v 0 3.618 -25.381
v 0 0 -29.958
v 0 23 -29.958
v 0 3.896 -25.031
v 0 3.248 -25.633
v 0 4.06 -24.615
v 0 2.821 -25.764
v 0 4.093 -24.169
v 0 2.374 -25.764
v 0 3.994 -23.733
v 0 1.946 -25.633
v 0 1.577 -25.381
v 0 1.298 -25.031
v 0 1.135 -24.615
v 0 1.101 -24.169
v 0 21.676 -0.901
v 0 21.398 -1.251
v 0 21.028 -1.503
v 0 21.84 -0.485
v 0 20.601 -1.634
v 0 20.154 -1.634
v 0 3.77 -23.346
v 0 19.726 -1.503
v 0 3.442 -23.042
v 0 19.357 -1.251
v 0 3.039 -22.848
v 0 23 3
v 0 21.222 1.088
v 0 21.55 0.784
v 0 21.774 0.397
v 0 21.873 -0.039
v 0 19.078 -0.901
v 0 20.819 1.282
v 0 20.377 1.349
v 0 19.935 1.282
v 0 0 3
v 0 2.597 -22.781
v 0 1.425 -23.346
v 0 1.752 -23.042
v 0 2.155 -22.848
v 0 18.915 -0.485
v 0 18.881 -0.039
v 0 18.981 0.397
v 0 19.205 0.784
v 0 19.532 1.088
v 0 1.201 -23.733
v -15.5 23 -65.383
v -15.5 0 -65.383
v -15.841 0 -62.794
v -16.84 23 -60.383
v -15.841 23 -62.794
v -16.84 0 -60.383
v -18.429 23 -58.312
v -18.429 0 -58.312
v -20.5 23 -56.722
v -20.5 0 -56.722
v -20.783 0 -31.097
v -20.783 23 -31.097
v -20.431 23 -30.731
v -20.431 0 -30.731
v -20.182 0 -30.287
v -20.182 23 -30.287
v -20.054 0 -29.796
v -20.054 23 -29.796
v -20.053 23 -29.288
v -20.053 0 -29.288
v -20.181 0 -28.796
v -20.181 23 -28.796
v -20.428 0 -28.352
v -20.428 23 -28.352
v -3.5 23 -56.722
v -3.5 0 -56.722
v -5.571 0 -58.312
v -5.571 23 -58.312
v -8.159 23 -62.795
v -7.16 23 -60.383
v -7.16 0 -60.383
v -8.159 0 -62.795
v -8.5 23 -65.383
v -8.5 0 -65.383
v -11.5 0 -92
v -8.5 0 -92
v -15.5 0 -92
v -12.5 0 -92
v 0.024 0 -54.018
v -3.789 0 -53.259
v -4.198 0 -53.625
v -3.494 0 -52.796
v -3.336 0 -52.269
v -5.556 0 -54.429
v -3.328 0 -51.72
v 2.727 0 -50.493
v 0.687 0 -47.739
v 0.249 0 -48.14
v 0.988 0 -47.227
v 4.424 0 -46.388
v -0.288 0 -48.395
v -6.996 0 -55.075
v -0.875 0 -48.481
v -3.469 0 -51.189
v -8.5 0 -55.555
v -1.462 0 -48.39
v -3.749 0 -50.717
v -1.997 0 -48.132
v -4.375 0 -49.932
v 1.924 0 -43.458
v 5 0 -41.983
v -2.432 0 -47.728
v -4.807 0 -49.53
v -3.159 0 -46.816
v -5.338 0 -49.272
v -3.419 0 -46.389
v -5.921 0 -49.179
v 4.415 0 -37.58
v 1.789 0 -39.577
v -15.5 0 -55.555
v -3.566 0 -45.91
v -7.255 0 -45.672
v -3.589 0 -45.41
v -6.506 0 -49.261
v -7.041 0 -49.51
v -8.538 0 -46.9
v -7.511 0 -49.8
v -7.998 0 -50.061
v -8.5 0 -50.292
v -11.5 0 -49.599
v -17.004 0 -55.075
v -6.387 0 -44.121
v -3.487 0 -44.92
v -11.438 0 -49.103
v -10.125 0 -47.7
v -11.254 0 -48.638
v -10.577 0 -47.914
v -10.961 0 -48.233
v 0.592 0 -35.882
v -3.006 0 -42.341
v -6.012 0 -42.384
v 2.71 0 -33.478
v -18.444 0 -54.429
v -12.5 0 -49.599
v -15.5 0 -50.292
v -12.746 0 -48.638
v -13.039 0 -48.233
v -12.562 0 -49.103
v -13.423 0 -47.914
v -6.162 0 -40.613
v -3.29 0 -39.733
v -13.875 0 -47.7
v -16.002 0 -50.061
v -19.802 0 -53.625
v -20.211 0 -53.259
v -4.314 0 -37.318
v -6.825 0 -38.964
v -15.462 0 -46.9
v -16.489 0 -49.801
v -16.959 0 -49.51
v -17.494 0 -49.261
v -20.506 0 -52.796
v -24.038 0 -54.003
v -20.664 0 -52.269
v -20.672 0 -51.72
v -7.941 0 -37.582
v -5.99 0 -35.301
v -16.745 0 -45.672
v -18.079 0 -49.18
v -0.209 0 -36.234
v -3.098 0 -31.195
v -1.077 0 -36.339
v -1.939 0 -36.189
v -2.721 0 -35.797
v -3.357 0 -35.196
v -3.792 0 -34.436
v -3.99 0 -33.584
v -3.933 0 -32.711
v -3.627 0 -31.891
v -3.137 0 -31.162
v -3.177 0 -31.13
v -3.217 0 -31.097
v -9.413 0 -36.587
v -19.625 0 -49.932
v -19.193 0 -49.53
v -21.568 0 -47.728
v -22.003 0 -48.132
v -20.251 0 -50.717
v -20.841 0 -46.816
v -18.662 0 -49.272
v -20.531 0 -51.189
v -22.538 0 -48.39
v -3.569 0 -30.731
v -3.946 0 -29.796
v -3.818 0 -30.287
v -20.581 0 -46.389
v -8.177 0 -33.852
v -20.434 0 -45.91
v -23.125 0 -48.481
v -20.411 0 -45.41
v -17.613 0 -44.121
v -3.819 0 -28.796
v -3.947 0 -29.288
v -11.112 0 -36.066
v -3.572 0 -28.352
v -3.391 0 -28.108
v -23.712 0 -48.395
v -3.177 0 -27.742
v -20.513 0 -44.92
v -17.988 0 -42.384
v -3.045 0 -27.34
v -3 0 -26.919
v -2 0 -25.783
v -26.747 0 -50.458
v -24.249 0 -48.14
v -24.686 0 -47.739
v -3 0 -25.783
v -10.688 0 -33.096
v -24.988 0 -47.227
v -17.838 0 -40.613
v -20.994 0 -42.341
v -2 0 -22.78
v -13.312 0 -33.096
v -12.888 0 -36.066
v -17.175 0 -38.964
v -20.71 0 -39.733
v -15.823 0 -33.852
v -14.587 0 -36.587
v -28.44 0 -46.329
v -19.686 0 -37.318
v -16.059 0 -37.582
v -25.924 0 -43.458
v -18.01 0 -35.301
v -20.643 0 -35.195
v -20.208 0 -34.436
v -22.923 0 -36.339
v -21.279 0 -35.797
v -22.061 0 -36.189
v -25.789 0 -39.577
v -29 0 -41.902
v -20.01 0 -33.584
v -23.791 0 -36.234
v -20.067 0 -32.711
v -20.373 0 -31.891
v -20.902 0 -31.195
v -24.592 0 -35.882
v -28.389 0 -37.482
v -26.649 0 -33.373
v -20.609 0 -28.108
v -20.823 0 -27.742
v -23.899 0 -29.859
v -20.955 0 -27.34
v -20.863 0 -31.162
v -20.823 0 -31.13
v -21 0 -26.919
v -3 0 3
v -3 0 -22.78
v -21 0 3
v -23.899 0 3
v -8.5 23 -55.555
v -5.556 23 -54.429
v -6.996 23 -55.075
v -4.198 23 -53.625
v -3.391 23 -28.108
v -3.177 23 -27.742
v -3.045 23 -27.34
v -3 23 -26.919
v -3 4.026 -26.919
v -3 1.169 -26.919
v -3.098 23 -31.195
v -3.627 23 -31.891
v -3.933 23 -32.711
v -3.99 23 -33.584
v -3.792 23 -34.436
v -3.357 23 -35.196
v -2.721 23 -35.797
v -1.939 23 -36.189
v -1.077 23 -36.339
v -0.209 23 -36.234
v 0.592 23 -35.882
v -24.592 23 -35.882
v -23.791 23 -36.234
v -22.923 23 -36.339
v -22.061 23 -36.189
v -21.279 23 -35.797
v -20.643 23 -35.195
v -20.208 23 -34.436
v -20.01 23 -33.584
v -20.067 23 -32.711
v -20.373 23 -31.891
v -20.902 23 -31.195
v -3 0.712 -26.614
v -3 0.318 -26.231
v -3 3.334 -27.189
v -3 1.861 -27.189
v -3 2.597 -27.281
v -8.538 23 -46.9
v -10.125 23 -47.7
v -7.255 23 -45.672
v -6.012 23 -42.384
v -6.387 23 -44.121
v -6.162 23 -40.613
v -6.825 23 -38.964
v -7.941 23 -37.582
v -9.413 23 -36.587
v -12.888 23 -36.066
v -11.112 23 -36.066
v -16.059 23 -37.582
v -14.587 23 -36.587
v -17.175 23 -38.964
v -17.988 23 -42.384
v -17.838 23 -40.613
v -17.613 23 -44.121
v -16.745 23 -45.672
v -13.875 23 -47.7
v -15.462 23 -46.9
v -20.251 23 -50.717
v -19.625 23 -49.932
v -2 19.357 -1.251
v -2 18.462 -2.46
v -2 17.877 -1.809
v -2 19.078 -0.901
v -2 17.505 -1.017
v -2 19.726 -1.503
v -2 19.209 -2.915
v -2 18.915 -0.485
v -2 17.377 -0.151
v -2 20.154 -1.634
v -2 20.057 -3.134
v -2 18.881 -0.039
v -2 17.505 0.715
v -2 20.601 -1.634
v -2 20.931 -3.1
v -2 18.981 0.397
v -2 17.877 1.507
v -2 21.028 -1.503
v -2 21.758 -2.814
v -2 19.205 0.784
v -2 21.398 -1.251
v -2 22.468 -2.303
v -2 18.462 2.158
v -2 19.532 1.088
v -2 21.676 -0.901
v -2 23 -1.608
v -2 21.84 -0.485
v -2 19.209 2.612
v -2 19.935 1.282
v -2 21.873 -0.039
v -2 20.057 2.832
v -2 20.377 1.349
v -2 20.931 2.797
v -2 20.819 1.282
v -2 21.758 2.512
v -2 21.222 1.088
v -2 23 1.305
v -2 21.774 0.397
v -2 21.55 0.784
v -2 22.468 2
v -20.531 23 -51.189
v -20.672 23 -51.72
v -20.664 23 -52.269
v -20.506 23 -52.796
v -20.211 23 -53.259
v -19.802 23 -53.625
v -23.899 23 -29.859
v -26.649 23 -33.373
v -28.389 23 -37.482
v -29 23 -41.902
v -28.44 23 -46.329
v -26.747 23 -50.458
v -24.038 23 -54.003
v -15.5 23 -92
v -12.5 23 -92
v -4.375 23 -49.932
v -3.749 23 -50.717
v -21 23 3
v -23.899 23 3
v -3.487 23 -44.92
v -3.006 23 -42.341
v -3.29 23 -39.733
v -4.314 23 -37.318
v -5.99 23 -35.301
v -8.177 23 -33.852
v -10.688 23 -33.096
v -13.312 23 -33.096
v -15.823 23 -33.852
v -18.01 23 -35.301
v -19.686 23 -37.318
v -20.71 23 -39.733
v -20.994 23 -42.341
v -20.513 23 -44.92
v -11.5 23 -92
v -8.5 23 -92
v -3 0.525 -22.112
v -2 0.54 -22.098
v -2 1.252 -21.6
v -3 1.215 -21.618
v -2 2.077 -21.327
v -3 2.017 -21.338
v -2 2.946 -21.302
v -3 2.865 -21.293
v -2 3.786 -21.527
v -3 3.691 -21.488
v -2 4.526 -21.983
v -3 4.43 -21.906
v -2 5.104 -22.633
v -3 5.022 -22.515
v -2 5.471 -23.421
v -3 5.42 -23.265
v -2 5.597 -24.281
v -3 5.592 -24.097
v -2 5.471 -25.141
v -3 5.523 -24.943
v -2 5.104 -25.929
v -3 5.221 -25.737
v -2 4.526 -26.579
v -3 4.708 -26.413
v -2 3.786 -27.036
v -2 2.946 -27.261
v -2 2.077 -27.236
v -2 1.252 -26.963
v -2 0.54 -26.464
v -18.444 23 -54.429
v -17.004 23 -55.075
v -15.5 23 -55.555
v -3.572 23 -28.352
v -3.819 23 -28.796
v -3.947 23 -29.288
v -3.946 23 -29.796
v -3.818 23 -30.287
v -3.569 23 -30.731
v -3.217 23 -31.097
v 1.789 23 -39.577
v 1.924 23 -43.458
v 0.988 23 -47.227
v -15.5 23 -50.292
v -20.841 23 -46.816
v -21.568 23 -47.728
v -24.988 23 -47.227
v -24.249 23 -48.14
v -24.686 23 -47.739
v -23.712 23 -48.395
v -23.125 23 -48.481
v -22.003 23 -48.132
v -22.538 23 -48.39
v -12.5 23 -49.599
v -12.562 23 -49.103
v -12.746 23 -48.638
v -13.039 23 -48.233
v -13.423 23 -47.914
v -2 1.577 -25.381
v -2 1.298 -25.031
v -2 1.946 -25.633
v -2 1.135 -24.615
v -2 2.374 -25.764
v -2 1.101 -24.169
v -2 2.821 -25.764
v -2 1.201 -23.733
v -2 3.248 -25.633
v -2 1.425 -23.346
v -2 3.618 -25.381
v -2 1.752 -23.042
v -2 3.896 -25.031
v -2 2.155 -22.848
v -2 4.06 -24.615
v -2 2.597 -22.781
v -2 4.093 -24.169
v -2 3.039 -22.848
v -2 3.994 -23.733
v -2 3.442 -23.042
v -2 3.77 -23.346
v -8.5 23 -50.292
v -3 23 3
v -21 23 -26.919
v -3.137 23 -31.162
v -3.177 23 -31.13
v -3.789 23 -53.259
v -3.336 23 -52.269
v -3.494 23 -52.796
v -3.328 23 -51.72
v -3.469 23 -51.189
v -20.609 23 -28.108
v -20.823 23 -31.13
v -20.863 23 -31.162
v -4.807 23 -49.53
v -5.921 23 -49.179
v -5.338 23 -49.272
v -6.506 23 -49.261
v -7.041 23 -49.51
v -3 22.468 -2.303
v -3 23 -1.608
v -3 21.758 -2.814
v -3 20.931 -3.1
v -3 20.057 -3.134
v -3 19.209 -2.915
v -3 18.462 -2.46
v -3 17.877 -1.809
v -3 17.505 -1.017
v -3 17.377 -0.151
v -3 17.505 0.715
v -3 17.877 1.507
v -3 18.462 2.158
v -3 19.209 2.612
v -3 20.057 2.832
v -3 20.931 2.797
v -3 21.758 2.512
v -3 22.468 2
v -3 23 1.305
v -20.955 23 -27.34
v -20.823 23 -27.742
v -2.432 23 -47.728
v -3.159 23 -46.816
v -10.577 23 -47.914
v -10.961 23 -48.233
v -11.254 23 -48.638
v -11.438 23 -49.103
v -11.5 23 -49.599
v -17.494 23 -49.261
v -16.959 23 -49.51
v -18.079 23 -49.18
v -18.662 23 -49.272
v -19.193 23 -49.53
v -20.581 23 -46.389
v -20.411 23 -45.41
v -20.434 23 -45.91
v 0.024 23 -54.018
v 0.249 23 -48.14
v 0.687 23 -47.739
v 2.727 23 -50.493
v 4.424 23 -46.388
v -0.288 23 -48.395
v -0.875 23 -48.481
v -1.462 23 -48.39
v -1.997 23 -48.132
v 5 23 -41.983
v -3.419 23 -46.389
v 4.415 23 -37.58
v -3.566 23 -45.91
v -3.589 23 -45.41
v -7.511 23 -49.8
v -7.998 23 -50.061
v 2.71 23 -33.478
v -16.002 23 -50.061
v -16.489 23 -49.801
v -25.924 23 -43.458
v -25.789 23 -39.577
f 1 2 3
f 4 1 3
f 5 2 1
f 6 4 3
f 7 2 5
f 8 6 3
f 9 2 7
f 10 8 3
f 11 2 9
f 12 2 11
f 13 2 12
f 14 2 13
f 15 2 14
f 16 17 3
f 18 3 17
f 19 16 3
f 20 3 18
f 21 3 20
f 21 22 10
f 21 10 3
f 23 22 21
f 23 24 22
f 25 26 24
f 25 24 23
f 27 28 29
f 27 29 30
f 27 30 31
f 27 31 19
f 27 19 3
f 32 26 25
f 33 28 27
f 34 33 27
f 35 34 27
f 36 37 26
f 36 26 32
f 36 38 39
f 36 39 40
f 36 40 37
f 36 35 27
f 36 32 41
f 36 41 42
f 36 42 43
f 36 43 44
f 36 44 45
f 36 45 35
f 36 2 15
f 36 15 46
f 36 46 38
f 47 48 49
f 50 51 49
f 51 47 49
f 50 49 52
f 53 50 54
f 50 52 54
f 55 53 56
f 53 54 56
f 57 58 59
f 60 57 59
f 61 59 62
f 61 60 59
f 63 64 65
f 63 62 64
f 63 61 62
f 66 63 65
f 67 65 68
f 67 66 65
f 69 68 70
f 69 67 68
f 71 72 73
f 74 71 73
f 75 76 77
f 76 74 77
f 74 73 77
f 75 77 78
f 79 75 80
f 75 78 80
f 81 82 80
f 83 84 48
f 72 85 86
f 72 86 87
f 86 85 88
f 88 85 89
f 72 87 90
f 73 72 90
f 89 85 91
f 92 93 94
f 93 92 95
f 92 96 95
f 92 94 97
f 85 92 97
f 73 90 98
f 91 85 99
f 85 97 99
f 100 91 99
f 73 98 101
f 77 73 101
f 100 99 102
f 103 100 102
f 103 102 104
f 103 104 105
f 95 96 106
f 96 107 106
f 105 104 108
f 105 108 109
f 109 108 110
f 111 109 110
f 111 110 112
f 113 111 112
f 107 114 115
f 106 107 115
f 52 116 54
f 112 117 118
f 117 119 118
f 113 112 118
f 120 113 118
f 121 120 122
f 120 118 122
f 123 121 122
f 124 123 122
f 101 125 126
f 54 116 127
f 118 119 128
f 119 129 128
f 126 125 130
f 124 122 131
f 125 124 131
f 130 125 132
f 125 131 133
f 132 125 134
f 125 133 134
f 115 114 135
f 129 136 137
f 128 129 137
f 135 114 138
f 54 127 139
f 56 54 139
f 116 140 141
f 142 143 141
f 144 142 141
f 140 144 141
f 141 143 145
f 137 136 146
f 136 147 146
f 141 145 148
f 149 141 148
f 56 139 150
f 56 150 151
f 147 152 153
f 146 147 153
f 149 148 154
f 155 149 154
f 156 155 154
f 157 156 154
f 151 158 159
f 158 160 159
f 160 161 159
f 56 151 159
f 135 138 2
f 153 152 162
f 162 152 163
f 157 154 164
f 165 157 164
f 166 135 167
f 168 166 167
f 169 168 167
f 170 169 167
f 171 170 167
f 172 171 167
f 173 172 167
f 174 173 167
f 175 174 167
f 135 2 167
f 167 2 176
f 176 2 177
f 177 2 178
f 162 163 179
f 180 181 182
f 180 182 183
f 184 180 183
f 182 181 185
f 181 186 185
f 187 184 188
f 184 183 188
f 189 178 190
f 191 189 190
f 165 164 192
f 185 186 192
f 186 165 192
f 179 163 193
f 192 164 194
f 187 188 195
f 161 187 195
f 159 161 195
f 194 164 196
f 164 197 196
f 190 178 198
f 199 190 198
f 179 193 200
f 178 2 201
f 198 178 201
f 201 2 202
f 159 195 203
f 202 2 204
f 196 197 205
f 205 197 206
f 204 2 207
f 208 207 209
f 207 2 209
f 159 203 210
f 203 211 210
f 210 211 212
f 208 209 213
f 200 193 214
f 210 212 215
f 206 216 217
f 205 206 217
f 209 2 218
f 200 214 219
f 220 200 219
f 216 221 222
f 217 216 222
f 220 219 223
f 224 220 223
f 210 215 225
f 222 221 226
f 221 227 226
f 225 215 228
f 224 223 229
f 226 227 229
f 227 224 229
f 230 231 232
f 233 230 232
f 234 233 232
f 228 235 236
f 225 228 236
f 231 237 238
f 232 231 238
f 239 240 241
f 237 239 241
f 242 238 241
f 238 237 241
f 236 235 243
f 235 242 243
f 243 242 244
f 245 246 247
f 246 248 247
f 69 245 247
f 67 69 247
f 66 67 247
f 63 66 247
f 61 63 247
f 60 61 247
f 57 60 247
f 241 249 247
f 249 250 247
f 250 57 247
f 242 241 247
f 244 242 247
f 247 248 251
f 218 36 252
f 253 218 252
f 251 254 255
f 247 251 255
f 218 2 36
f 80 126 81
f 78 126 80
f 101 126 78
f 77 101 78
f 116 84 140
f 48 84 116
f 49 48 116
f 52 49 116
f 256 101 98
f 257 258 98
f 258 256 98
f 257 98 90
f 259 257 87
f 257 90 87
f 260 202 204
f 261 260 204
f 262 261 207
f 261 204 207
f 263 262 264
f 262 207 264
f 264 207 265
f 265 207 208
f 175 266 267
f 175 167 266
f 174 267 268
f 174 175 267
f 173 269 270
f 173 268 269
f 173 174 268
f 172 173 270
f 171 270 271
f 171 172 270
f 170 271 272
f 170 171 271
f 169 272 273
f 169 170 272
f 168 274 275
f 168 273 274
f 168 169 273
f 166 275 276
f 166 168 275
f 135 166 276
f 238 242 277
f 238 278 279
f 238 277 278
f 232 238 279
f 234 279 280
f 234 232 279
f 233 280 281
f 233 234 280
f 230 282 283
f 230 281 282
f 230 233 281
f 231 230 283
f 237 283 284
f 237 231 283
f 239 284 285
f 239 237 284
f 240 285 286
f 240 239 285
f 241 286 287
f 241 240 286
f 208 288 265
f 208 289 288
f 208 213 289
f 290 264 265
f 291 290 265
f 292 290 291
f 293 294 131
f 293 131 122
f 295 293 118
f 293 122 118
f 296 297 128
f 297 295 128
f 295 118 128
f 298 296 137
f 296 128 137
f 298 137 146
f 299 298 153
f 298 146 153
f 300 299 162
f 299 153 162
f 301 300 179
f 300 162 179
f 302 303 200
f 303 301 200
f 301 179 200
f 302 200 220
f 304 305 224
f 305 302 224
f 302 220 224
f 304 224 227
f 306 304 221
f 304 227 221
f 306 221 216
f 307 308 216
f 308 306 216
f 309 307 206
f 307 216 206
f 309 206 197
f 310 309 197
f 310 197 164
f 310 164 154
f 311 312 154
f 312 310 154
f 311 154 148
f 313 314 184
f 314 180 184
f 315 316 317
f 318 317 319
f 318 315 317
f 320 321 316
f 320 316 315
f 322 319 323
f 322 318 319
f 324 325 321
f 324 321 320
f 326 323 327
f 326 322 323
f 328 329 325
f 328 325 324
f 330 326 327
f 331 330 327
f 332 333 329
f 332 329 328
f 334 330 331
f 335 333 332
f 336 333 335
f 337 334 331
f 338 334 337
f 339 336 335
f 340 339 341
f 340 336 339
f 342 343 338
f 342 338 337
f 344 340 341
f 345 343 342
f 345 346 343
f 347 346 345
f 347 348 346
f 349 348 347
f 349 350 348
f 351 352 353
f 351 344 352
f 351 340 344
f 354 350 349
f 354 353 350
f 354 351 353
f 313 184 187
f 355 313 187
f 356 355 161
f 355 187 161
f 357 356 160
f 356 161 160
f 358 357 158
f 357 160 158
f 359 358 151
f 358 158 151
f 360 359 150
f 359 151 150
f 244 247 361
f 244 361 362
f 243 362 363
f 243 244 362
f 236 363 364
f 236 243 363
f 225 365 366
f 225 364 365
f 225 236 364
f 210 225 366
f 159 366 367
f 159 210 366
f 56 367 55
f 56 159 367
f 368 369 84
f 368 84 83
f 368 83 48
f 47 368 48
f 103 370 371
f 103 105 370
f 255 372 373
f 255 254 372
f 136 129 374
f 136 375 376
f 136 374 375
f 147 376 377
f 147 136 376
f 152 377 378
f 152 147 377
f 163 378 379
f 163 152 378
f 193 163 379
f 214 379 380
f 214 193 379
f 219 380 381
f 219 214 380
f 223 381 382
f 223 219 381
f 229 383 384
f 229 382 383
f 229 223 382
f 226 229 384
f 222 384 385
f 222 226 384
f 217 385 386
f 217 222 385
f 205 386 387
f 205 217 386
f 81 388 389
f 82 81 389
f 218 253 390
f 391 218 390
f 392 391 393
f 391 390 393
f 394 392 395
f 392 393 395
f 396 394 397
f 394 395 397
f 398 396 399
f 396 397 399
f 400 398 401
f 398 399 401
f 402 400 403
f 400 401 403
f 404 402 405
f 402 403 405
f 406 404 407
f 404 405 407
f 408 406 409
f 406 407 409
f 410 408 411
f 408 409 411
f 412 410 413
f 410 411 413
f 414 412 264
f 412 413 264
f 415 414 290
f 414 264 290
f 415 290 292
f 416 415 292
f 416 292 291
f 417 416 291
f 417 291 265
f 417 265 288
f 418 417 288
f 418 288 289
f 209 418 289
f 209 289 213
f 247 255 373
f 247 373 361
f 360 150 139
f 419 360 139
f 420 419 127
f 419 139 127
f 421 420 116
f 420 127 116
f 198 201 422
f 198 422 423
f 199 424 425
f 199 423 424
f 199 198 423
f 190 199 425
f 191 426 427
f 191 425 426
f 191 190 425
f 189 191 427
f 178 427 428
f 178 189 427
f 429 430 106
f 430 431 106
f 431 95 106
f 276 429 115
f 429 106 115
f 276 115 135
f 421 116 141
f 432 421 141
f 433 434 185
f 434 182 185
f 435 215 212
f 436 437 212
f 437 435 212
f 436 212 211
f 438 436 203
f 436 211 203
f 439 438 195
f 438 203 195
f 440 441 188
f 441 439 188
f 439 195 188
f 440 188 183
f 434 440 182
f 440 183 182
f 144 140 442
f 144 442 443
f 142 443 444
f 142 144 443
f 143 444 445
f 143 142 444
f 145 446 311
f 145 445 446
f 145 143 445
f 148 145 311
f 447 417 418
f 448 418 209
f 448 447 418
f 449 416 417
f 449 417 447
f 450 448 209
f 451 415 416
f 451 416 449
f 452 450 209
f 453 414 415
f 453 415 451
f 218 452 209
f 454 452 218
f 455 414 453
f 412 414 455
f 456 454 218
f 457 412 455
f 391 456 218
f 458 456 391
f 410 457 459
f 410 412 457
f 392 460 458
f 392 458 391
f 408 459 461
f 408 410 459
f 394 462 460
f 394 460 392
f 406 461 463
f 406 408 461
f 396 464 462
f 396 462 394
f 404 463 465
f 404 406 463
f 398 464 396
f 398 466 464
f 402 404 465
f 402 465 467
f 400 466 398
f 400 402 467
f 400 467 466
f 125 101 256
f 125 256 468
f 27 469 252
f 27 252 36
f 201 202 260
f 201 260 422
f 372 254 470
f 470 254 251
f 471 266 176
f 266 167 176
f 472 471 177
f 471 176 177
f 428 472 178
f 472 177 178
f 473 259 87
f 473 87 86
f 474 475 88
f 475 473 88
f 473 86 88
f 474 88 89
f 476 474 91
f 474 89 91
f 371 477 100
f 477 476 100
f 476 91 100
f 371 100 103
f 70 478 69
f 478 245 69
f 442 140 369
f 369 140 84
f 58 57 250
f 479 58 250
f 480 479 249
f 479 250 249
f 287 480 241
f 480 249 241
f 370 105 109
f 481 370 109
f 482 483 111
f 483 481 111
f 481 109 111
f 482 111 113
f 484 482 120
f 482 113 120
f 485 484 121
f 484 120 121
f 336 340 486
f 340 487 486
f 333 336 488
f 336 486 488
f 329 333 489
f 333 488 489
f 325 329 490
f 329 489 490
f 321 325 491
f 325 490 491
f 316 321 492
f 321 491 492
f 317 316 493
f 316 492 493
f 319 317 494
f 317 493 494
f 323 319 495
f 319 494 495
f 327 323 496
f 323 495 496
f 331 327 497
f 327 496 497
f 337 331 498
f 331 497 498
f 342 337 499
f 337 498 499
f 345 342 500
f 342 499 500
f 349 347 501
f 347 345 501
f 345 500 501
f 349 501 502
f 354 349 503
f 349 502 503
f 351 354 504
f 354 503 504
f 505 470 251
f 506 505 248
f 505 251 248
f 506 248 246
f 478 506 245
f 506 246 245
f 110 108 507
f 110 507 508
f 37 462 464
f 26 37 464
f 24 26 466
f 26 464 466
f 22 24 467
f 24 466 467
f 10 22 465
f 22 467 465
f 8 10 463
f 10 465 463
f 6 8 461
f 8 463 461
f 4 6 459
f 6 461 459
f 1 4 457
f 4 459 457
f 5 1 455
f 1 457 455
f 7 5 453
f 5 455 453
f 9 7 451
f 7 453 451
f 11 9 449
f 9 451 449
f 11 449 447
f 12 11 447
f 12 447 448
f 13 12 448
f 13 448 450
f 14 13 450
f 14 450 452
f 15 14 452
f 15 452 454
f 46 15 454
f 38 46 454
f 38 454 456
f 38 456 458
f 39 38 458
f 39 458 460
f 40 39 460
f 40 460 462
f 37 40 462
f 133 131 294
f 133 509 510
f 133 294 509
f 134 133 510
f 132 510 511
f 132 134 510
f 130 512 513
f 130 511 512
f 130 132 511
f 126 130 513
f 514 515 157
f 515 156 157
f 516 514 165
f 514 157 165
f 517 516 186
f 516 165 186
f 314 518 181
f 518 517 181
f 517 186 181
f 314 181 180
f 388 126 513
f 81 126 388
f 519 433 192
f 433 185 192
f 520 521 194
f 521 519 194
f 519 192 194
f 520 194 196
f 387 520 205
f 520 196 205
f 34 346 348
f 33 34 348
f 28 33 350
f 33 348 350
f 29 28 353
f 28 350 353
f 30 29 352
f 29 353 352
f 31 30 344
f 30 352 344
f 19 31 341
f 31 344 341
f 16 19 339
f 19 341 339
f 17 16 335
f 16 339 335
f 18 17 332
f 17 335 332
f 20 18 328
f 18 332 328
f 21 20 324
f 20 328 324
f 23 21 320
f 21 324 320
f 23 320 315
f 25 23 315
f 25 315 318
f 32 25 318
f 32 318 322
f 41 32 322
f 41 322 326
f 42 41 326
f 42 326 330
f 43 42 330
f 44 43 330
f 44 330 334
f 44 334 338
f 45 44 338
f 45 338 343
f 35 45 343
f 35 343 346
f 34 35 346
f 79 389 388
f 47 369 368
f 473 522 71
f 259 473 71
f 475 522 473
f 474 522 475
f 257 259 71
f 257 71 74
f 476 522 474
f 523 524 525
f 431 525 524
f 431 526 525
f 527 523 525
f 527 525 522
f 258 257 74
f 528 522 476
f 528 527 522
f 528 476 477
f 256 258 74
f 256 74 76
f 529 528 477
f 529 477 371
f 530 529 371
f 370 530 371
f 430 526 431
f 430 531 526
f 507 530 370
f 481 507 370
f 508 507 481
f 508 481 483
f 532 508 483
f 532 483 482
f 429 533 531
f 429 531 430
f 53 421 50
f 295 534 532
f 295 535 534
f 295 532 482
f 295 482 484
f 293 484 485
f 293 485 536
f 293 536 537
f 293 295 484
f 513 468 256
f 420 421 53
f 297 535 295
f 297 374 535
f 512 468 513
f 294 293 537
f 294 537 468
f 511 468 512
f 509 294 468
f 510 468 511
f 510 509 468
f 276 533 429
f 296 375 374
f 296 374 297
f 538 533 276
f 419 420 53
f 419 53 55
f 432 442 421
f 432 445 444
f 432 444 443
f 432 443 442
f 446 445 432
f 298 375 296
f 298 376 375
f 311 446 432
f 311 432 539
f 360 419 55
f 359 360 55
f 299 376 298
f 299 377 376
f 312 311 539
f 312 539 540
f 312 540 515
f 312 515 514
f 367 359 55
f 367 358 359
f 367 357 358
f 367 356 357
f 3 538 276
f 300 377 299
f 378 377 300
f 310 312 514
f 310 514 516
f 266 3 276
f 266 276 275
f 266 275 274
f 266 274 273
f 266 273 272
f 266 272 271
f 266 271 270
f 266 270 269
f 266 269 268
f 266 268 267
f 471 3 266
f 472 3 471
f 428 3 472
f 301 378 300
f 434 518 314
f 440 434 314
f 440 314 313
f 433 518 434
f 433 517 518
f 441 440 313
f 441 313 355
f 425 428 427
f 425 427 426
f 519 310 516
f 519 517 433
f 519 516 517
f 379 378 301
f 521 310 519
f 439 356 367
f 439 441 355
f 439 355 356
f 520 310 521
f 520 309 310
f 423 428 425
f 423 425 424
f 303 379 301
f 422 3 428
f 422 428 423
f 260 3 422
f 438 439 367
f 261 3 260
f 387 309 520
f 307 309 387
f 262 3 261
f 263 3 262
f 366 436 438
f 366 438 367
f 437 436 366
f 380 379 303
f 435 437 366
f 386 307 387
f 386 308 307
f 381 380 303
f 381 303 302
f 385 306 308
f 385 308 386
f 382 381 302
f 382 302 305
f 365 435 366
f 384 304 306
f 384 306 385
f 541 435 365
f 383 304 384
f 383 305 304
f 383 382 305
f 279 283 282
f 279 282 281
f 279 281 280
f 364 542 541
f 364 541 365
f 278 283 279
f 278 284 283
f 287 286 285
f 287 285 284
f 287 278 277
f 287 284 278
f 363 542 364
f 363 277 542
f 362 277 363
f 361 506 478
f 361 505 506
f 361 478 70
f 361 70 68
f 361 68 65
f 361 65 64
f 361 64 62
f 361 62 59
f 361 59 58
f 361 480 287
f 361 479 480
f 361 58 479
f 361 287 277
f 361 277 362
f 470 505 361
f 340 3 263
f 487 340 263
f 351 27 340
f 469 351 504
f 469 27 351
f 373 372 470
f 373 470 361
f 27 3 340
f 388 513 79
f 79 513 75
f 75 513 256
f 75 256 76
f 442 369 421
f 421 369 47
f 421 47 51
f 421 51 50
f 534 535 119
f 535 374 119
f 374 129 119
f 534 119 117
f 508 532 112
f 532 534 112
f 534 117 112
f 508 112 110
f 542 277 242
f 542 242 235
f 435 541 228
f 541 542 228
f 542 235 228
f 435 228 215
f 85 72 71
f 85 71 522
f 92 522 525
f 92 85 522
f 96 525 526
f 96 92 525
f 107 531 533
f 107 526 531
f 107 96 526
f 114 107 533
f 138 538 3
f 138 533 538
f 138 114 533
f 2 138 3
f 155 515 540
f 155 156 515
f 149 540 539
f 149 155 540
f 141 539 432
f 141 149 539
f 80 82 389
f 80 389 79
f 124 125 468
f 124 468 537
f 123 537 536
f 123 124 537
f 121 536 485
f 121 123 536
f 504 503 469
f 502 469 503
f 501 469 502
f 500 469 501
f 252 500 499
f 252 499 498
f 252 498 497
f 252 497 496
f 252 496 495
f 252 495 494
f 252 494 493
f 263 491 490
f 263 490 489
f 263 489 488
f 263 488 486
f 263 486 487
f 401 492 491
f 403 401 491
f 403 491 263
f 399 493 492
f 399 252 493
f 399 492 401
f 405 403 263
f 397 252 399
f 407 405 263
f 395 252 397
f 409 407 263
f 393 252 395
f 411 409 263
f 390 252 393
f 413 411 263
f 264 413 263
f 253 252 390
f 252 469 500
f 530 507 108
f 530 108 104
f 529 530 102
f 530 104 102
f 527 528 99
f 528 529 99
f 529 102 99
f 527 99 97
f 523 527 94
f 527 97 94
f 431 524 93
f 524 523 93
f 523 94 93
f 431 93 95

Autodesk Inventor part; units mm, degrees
ref_plane "YZ Plane" through (0, 0, 0) normal (1, 0, 0) x (0, 1, 0)
ref_plane "XZ Plane" through (0, 0, 0) normal (0, 1, 0) x (-1, 0, 0)
ref_plane "XY Plane" through (0, 0, 0) normal (0, 0, 1) x (1, 0, 0)
sketch "Sketch1" plane through (0, 0, 0) normal (0, 1, 0) x (-1, 0, 0)
  line L0 (3, 0) -> (3, -26.9193)
  line L1 (0, -30) -> (0, 0)
  line L2 (3, 0) -> (3, 3)
  line L3 (3, 3) -> (0, 3)
  line L4 (0, 3) -> (0, 0)
  line L5 (21, 0) -> (21, -26.9193)
  line L6 (23.8993, -30) -> (23.8993, -0.0434)
  line L7 (21, 0) -> (21, 3)
  line L8 (21, 3) -> (23.8993, 3)
  line L9 (23.8993, 3) -> (23.8993, -0.0434)
  line L10 (20.6088, -28.1075) -> (20.4284, -28.3517)
  line L11 (3.3912, -28.1075) -> (3.5716, -28.3517)
  arc A0 (13.875, -47.6995) -> (10.125, -47.6995) centre (12, -42) ccw
  line L12 (12.5, -49.5993) -> (12.5, -92)
  line L13 (12.5, -92) -> (15.5, -92)
  line L14 (11.5, -49.5993) -> (11.5, -92)
  line L15 (11.5, -92) -> (8.5, -92)
  arc A1 (0, -29.9584) -> (3.5, -56.7224) centre (12, -42) ccw
  arc A2 (20.5, -56.7224) -> (23.8993, -29.8589) centre (12, -42) ccw
  line L16 (15.5, -92) -> (15.5, -65.3827)
  line L17 (15.5, -55.5554) -> (15.5, -50.2916)
  line L18 (8.5, -92) -> (8.5, -65.3827)
  line L19 (8.5, -55.5554) -> (8.5, -50.2916)
  arc A3 (20.9024, -31.195) -> (20.7826, -31.0974) centre (12, -42) ccw
  line L20 (19.6249, -49.9324) -> (20.2507, -50.7171)
  line L21 (23.8993, -51.3801) -> (24.2551, -51.0964)
  line L22 (21.5685, -47.7276) -> (20.8413, -46.8158)
  arc A4 (15.5, -55.5554) -> (19.8016, -53.6248) centre (12, -42) ccw
  arc A5 (24.9875, -47.2274) -> (24.5925, -35.8822) centre (12, -42) ccw
  arc A6 (15.5, -50.2916) -> (16.9592, -49.5104) centre (12, -42) ccw
  line L23 (4.3751, -49.9324) -> (3.7493, -50.7171)
  line L24 (2.4315, -47.7276) -> (3.1587, -46.8158)
  arc A7 (20.5132, -44.9199) -> (3.4868, -44.9199) centre (12, -42) ccw
  arc A8 (7.0408, -49.5104) -> (8.5, -50.2916) centre (12, -42) ccw
  arc A9 (4.1984, -53.6248) -> (8.5, -55.5554) centre (12, -42) ccw
  arc A10 (3.2174, -31.0974) -> (3.0976, -31.195) centre (12, -42) ccw
  arc A11 (-0.5925, -35.8822) -> (-0.9875, -47.2274) centre (12, -42) ccw
  arc A12 (20.5, -56.7224) -> (15.5, -65.3827) centre (25.5, -65.3827) ccw
  arc A13 (8.5, -65.3827) -> (3.5, -56.7224) centre (-1.5, -65.3827) ccw
  arc A14 (7.0408, -49.5104) -> (4.3751, -49.9324) centre (5.9387, -51.1794) ccw
  arc A15 (3.1587, -46.8158) -> (3.4868, -44.9199) centre (1.595, -45.5688) ccw
  arc A16 (-0.9875, -47.2274) -> (2.4315, -47.7276) centre (0.8679, -46.4806) ccw
  arc A17 (3.7493, -50.7171) -> (4.1984, -53.6248) centre (5.3129, -51.9641) ccw
  arc A18 (19.6249, -49.9324) -> (16.9592, -49.5104) centre (18.0613, -51.1794) ccw
  arc A19 (21.5685, -47.7276) -> (24.9875, -47.2274) centre (23.1321, -46.4806) ccw
  arc A20 (19.8016, -53.6248) -> (20.2507, -50.7171) centre (18.6871, -51.9641) ccw
  arc A21 (20.5132, -44.9199) -> (20.8413, -46.8158) centre (22.405, -45.5688) ccw
  arc A22 (3.2174, -31.0974) -> (3.5716, -28.3517) centre (1.9628, -29.5399) ccw
  arc A23 (20.4284, -28.3517) -> (20.7826, -31.0974) centre (22.0372, -29.5399) ccw
  arc A24 (20.6088, -28.1075) -> (21, -26.9193) centre (19, -26.9193) ccw
  arc A25 (3, -26.9193) -> (3.3912, -28.1075) centre (5, -26.9193) ccw
  arc A26 (13.875, -47.6995) -> (12.5, -49.5993) centre (14.5, -49.5993) ccw
  arc A27 (11.5, -49.5993) -> (10.125, -47.6995) centre (9.5, -49.5993) ccw
  arc A28 (20.9024, -31.195) -> (24.5925, -35.8822) centre (23, -33.3397) ccw
  arc A29 (-0.5925, -35.8822) -> (3.0976, -31.195) centre (1, -33.3397) ccw
  point P0 (19.2111, -30)
  point P1 (4.7889, -30)
  point P2 (12.5, -47.9791)
  point P3 (11.5, -47.9791)
  point P4 (8.5, -58.6358)
  point P5 (15.5, -58.6358)
  point P6 (18.3696, -48.3583)
  point P7 (21.4999, -52.2835)
  point P8 (23.4384, -50.0724)
  point P9 (20.1111, -45.9001)
  point P10 (5.6304, -48.3583)
  point P11 (2.5001, -52.2835)
  point P12 (0.5616, -50.0724)
  point P13 (3.8889, -45.9001)
  dimension "d4" = 3
  dimension "d6" = 3
  dimension "d7" = 3
  dimension "d8" = 90
  dimension "d9" = 10
  dimension "d10" = 2
  dimension "d11" = 2
  dimension "d12" = 2
  dimension "d13" = 6
  dimension "d14" = 6
extrude "Extrusion1" add sketch "Sketch1" along normal blind 23
sketch "Sketch3" plane through (-3, 0, -26.9193) normal (-1, 0, 0) x (0, 0, 1)
  line L0 (0, 23) -> (29.9193, 23) projected
  line L1 (29.9193, 23) -> (15.7246, 23)
  circle A0 centre (26.7681, 20.3773) radius 1.5
  circle A1 centre (26.7681, 20.3773) radius 3
  circle A2 centre (2.6381, 2.5973) radius 1.5
  circle A3 centre (2.6381, 2.5973) radius 3
  point P0 (26.9193, 0)
  point P1 (1.7246, 22.9923)
  point P2 (26.9193, 46)
  point P3 (1.7246, 23.0077)
extrude "Extrusion2" cut sketch "Sketch3" against normal blind 1 contours A1 L0 | L0 A1 | A0 | A2 | A3
extrude "Extrusion3" cut sketch "Sketch3" against normal blind 3 contours A0 | A2
